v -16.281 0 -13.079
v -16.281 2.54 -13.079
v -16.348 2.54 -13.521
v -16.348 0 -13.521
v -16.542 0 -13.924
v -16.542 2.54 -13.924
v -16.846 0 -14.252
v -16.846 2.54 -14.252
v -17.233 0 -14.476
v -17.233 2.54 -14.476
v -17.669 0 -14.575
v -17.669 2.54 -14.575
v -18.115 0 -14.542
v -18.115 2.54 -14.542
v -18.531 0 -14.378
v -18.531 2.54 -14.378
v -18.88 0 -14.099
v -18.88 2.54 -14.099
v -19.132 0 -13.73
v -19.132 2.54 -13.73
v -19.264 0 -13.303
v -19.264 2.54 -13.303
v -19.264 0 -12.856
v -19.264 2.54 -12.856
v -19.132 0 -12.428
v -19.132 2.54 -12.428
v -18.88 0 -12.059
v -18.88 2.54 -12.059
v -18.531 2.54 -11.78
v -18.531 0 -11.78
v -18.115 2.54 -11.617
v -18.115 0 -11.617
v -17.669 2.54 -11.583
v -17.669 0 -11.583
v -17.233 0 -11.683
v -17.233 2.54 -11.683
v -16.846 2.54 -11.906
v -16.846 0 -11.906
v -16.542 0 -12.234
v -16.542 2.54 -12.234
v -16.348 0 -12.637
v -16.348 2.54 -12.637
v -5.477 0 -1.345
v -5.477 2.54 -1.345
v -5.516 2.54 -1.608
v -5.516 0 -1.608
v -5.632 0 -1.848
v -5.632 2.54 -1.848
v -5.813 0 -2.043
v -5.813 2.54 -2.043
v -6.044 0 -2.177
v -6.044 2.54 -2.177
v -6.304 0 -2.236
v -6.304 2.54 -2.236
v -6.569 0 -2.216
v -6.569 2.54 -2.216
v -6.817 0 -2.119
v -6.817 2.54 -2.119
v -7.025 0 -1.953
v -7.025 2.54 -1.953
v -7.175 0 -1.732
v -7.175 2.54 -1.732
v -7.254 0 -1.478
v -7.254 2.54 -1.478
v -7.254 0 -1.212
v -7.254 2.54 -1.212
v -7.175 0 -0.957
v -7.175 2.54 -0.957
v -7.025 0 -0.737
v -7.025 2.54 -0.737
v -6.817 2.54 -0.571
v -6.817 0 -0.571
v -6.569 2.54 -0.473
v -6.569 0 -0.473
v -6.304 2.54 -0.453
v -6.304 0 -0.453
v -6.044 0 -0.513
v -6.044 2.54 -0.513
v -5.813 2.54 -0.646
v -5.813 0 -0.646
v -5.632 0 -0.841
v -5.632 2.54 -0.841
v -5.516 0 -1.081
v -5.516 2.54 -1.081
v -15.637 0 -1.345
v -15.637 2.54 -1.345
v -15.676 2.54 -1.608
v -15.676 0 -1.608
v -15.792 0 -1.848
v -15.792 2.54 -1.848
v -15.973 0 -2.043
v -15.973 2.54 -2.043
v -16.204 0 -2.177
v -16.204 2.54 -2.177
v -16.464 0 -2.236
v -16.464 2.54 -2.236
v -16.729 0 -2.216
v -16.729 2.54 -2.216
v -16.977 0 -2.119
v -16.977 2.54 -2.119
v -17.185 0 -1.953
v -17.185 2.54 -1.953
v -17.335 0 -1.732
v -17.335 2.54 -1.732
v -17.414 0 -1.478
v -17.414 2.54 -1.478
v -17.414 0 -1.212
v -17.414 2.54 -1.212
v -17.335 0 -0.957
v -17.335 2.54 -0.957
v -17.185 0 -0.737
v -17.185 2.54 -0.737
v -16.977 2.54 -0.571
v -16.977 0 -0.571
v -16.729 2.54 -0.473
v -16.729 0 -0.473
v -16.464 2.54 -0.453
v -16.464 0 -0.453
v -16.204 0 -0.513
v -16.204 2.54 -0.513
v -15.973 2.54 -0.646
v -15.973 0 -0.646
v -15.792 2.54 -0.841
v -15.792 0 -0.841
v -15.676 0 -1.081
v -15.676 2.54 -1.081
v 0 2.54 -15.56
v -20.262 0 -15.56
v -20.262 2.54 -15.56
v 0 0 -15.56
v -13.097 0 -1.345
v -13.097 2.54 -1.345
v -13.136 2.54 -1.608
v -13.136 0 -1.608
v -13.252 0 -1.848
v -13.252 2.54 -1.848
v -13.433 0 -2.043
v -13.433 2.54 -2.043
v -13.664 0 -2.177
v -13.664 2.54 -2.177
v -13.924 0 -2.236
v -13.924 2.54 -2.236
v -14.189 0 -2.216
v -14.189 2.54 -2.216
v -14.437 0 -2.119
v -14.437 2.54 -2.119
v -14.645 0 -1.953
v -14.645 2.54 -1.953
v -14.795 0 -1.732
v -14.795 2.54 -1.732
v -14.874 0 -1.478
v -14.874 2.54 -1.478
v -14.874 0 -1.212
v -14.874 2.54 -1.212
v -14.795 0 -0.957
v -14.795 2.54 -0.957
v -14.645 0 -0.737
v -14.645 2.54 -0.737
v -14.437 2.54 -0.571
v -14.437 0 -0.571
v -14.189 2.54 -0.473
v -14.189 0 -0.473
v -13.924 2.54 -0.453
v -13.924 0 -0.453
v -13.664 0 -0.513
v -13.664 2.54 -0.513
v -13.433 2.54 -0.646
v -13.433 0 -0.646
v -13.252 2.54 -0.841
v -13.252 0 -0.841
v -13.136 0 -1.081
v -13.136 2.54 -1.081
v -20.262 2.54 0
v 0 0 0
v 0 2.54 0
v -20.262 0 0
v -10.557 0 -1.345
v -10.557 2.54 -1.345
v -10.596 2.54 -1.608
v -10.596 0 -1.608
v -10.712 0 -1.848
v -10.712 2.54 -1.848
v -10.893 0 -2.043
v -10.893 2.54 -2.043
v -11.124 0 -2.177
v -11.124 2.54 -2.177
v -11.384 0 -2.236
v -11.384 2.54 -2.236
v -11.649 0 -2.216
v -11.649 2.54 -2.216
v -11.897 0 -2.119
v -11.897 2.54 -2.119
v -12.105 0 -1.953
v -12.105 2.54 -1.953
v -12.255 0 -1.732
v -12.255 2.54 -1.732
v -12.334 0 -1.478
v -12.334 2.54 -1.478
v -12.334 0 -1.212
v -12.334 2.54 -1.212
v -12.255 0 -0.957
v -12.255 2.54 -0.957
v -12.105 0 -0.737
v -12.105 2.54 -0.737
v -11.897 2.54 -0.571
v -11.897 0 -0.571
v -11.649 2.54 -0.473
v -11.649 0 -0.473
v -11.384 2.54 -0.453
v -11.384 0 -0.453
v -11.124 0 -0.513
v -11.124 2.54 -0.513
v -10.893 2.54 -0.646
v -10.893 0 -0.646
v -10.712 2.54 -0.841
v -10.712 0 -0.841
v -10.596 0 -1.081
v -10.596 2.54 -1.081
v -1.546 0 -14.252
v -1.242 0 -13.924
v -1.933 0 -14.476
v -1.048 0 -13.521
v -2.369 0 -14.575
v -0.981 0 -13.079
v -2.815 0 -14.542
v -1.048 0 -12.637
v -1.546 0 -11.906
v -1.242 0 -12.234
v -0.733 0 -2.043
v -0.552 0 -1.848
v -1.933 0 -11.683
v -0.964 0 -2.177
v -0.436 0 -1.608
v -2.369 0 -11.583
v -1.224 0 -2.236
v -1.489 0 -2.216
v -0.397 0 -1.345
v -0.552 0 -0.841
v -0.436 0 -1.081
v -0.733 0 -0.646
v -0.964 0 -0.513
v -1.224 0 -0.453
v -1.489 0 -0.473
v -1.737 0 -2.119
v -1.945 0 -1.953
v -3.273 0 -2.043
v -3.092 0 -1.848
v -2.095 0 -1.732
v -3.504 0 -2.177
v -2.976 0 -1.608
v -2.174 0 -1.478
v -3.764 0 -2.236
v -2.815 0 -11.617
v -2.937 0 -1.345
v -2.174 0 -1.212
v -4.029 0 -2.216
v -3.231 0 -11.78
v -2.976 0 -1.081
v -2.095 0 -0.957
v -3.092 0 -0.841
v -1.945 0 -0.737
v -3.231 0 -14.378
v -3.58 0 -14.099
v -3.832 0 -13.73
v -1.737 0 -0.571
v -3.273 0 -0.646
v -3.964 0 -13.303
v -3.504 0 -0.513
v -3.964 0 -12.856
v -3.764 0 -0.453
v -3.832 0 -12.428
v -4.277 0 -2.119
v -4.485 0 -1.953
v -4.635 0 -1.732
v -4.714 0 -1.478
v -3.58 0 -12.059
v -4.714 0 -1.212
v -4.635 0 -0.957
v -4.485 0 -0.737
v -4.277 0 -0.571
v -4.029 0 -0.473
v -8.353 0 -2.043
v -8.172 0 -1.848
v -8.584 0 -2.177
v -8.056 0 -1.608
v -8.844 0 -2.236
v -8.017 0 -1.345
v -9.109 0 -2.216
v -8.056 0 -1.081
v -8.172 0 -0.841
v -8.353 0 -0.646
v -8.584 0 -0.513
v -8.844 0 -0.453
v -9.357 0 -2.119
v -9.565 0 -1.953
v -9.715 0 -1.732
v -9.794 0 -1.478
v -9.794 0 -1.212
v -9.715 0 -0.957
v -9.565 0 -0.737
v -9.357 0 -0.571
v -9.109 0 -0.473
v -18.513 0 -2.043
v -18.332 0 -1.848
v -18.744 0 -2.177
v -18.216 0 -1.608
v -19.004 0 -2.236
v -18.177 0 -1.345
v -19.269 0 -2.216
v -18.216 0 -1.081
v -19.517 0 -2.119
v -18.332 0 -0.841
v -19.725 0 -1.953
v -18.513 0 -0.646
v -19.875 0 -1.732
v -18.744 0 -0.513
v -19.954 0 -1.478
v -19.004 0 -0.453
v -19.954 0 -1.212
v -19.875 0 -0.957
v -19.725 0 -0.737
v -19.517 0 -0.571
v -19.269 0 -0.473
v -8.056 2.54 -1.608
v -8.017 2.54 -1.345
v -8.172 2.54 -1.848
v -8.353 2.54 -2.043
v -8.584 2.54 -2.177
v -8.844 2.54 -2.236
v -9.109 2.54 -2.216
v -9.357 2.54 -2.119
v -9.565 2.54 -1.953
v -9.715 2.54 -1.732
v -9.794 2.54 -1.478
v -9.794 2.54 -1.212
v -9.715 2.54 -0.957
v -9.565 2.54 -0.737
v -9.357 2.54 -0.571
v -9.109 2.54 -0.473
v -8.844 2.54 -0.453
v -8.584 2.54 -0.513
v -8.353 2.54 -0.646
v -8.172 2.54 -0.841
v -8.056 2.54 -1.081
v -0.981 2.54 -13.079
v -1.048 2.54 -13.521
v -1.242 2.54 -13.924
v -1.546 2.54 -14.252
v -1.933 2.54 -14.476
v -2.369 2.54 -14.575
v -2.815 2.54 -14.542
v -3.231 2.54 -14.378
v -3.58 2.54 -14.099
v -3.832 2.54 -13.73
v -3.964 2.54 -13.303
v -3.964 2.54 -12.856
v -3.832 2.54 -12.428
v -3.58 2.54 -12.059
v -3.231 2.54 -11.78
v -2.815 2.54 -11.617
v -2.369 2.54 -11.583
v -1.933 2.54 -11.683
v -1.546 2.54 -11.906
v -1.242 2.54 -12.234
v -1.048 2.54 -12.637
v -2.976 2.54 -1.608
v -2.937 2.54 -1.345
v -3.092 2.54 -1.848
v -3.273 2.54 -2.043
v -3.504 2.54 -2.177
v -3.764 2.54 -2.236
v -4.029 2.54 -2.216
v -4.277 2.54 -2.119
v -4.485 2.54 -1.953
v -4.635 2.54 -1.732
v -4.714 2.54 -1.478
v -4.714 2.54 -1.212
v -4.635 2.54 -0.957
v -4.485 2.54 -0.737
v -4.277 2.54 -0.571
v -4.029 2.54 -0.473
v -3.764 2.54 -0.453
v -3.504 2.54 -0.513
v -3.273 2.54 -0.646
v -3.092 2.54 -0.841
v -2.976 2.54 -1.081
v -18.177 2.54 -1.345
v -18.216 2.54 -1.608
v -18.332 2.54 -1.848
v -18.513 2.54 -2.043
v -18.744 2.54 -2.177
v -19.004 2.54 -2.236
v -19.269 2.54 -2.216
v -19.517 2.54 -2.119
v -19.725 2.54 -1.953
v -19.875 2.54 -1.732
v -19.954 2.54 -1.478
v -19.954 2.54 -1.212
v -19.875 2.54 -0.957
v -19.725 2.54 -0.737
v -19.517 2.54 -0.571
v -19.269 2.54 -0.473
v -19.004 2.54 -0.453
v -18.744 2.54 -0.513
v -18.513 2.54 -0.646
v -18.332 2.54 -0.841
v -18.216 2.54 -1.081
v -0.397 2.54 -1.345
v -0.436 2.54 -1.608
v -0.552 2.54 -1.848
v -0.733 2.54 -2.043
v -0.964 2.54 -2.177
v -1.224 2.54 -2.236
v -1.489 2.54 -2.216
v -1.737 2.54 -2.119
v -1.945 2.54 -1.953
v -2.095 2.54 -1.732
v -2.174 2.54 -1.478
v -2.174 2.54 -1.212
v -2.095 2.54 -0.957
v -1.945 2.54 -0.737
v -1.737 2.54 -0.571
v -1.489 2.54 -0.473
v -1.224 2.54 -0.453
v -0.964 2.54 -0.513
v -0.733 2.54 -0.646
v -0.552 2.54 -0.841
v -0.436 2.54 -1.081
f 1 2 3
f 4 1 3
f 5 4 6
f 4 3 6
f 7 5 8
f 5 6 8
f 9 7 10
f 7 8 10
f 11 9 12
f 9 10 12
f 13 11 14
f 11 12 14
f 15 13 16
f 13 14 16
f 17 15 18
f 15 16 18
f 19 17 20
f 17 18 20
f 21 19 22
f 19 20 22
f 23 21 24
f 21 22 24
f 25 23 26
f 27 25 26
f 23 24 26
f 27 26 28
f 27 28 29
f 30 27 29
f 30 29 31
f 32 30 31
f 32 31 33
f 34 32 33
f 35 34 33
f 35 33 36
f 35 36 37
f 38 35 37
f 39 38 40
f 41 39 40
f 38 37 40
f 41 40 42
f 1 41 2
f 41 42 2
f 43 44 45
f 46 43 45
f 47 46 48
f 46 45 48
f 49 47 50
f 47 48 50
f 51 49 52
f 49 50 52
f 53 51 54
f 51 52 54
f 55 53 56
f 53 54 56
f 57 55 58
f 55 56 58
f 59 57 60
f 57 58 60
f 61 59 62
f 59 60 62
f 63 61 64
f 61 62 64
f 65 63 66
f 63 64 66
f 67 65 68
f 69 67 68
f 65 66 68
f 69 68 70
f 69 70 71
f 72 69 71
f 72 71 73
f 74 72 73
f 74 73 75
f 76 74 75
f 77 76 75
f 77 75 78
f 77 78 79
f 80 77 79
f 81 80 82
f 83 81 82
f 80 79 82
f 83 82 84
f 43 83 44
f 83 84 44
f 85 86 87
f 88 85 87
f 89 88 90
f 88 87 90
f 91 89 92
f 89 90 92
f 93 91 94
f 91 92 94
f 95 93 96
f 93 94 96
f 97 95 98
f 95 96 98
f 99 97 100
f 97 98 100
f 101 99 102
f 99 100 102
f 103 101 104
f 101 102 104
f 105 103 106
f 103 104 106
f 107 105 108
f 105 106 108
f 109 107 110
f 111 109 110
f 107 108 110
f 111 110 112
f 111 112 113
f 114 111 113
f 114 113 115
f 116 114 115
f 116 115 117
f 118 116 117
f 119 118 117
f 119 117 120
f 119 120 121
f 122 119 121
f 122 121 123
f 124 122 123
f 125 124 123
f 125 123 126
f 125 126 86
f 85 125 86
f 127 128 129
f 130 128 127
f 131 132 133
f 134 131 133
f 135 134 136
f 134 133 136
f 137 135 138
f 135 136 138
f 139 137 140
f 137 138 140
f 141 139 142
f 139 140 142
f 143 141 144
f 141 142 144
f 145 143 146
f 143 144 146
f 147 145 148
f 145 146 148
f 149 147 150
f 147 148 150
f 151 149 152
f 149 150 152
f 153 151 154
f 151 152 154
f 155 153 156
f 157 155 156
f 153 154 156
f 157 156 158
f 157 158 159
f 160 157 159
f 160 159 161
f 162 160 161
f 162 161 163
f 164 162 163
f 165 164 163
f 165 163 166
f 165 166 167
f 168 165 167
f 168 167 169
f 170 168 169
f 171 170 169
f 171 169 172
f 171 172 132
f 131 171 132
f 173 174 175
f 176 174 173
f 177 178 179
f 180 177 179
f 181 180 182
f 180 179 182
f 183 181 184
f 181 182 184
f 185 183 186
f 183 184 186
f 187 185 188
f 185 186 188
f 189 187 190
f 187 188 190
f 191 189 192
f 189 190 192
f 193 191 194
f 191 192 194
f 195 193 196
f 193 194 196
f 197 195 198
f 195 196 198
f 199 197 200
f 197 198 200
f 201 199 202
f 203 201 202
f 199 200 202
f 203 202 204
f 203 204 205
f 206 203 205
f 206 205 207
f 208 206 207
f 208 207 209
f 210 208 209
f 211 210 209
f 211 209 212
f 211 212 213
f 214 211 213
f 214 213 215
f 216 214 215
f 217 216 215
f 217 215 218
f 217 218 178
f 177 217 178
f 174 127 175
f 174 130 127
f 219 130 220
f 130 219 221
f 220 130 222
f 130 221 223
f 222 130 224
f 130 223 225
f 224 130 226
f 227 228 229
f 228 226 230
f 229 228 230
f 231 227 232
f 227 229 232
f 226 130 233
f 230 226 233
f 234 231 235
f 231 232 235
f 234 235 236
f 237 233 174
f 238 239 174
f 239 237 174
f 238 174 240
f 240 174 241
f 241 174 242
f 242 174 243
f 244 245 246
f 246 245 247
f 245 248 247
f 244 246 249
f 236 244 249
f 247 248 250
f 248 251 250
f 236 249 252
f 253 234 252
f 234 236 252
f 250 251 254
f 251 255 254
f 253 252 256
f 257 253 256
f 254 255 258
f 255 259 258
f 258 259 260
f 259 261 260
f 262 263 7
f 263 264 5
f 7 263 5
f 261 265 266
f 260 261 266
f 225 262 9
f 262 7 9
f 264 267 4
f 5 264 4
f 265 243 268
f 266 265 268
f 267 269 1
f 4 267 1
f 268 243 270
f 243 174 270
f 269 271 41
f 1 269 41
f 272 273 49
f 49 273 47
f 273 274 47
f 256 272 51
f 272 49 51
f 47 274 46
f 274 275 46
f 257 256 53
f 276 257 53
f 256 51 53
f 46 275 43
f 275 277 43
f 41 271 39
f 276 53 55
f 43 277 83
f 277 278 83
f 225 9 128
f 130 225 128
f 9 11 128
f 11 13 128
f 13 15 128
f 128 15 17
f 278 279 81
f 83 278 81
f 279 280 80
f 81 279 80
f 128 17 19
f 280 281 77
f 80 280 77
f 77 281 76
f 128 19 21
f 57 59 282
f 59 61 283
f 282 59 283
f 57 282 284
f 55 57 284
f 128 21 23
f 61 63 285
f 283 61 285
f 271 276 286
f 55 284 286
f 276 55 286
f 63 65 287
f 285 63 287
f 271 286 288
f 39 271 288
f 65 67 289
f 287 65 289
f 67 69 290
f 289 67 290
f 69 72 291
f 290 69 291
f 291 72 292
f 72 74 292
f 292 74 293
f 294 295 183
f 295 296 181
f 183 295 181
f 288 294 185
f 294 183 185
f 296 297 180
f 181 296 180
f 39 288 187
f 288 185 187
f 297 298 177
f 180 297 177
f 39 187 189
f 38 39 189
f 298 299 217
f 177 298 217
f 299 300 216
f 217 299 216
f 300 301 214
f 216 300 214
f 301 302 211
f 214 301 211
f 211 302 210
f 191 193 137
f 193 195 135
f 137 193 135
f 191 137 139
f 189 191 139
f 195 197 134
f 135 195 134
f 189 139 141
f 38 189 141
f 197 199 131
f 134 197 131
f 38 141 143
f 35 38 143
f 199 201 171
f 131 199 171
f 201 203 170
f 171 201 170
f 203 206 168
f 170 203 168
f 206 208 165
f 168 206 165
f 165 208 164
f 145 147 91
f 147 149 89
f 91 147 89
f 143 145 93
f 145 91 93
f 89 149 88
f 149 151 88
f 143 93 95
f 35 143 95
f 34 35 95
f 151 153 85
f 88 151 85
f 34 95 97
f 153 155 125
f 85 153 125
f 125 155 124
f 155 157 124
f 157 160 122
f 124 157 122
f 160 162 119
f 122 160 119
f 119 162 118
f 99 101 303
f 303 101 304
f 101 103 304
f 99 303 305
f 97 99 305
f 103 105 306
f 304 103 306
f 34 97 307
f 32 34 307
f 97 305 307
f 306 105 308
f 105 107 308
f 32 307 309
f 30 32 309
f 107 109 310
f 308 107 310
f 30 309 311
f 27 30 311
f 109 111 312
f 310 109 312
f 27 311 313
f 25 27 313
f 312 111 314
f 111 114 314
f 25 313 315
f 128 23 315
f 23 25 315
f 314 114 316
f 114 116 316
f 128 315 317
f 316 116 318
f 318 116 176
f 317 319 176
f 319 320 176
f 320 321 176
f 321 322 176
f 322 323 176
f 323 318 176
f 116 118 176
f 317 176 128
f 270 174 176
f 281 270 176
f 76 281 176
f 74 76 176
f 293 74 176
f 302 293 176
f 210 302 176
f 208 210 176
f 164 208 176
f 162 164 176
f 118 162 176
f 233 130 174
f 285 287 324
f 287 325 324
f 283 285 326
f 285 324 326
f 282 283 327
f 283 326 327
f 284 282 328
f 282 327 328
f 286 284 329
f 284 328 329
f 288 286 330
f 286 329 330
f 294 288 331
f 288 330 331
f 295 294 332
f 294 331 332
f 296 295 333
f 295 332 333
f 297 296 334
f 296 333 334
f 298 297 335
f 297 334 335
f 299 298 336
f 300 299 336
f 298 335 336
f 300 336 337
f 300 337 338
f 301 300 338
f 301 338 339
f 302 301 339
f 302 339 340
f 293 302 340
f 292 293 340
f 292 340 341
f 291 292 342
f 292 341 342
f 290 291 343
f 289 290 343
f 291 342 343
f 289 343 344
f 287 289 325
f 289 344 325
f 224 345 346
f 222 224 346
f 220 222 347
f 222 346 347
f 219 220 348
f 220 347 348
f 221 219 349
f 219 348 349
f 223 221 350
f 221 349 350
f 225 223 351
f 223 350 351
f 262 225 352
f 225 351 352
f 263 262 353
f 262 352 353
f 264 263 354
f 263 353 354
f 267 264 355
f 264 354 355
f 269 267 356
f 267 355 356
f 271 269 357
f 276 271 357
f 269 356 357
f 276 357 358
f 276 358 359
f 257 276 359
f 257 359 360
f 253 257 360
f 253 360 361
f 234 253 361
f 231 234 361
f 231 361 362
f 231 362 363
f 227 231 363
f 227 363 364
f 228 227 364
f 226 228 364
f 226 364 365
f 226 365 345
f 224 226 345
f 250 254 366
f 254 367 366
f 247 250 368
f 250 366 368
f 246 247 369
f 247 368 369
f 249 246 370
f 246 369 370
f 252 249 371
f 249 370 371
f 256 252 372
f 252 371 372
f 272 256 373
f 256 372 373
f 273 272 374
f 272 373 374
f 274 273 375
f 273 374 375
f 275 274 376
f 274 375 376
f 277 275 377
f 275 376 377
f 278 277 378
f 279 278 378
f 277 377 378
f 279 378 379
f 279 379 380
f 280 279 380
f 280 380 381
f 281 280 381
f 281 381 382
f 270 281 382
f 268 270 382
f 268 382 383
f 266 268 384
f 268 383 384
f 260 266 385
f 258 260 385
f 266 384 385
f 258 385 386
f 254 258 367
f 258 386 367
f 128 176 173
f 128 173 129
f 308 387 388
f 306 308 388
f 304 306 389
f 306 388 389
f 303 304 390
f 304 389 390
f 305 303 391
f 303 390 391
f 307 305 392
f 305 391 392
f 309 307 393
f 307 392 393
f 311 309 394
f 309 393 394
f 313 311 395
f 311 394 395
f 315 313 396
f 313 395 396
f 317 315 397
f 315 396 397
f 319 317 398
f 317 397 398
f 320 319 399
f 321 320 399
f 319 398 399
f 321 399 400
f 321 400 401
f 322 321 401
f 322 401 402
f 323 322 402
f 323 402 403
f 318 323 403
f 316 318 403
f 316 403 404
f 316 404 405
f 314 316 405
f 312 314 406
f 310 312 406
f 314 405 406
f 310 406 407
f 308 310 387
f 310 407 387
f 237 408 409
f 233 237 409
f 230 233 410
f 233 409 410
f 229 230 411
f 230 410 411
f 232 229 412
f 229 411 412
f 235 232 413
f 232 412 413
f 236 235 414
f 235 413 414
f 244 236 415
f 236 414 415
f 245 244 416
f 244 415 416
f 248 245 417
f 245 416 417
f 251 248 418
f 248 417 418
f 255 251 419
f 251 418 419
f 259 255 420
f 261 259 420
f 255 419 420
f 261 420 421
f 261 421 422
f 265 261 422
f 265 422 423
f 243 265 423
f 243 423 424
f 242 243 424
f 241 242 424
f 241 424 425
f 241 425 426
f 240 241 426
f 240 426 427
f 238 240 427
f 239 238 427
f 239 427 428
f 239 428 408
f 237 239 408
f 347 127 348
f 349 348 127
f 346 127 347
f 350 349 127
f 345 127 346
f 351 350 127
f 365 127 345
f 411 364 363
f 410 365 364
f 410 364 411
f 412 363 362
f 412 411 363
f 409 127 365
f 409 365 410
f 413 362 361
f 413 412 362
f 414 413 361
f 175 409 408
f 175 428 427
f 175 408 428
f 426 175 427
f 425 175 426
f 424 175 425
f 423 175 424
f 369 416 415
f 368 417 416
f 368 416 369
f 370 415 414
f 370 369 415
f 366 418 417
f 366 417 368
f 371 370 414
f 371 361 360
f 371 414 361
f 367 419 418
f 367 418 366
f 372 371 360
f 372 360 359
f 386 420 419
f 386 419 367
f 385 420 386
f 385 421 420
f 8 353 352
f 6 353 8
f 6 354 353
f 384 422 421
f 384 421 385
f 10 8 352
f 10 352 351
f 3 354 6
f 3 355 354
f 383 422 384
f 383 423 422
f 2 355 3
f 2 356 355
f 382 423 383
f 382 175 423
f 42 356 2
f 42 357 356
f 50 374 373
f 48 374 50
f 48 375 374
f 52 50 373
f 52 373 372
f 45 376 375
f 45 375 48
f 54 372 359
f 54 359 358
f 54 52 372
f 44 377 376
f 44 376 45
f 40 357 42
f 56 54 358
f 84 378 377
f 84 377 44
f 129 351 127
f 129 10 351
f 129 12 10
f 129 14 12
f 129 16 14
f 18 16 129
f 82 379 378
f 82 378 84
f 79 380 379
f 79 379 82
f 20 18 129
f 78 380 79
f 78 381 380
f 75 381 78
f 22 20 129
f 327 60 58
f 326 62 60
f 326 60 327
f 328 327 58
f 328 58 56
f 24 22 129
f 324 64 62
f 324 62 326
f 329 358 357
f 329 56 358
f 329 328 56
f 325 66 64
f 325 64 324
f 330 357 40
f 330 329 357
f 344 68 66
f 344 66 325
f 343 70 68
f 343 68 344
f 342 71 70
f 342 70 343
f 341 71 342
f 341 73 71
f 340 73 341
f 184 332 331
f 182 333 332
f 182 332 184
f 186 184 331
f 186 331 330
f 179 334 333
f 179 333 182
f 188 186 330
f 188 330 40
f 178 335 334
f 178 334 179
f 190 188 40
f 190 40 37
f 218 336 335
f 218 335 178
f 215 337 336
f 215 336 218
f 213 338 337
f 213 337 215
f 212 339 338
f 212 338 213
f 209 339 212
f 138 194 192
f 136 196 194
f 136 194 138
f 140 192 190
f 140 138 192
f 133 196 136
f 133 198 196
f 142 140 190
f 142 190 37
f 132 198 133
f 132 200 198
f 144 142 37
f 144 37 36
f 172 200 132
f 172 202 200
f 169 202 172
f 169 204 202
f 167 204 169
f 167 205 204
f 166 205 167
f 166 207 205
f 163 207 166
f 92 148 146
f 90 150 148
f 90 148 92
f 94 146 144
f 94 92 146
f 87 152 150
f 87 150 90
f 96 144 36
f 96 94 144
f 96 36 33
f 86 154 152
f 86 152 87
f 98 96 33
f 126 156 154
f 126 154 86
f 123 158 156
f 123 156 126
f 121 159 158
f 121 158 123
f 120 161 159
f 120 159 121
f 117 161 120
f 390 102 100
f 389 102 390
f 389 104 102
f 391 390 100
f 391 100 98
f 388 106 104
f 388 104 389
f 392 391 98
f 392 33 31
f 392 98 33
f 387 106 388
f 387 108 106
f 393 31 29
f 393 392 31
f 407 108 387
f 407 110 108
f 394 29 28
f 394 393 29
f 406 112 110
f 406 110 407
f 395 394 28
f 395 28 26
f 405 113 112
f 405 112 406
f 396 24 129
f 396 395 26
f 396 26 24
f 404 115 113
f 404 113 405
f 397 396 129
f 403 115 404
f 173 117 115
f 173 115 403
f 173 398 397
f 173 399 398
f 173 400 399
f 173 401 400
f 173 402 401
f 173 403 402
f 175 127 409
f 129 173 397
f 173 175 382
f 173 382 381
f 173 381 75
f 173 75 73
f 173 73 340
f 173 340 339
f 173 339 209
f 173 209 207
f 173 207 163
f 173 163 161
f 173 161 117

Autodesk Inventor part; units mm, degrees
ref_plane "YZ Plane" through (0, 0, 0) normal (1, 0, 0) x (0, 1, 0)
ref_plane "XZ Plane" through (0, 0, 0) normal (0, 1, 0) x (-1, 0, 0)
ref_plane "XY Plane" through (0, 0, 0) normal (0, 0, 1) x (1, 0, 0)
sketch "Sketch1" plane through (0, 0, 0) normal (0, 1, 0) x (-1, 0, 0)
  line L0 (0, 0) -> (20.2618, 0)
  line L1 (20.2618, 0) -> (20.2618, -15.5601)
  line L2 (20.2618, -15.5601) -> (0, -15.5601)
  line L3 (0, -15.5601) -> (0, 0)
  dimension "d0" = 20.2618
  dimension "d1" = 15.5601
extrude "Extrusion1" add sketch "Sketch1" along normal blind 2.54
sketch "Sketch2" plane through (0, 2.54, 0) normal (0, 1, 0) x (1, 0, 0)
  circle A0 centre (-19.0703, 1.3447) radius 0.8937
  line L0 (-20.2618, 15.5601) -> (-20.2618, 0) construction
  line L1 (-20.2618, 0) -> (0, 0) construction
  line L2 (-20.2618, 0) -> (0, 0) construction
  circle A1 centre (-16.5303, 1.3447) radius 0.8937
  circle A2 centre (-13.9903, 1.3447) radius 0.8937
  circle A3 centre (-11.4503, 1.3447) radius 0.8937
  circle A4 centre (-8.9103, 1.3447) radius 0.8937
  circle A5 centre (-6.3703, 1.3447) radius 0.8937
  circle A6 centre (-3.8303, 1.3447) radius 0.8937
  circle A7 centre (-1.2903, 1.3447) radius 0.8937
  circle A8 centre (-17.7809, 13.0792) radius 1.5
  circle A9 centre (-2.4809, 13.0792) radius 1.5
  line L3 (0, 15.5601) -> (-20.2618, 15.5601) projected
  line L4 (0, 0) -> (0, 15.5601) projected
  line L5 (-17.7809, 13.0792) -> (-2.4809, 13.0792) construction
  line L6 (-10.1309, 0) -> (-10.1309, 15.5601) construction
  point P0 (-10.1309, 13.0792)
  dimension "d6" = 2.54
  dimension "d11" = 3
  dimension "d12" = 3
  dimension "d17" = 15.3
  dimension "d18" = 2.4809
  dimension "d19" = 2.4809
extrude "Extrusion2" cut sketch "Sketch2" against normal up to next
sketch "Sketch3" plane through (0, 2.54, 0) normal (0, 1, 0) x (1, 0, 0)
  line L0 (-14.6694, 9.1277) -> (-2.5672, 9.1277) construction
  line L1 (-2.5672, 9.1277) -> (-2.5672, 4.9306) construction
  line L2 (-2.5672, 4.9306) -> (-14.6694, 4.9306) construction
  line L3 (-14.6694, 4.9306) -> (-14.6694, 9.1277) construction
  point P0 (0, 0)
equation "\"d19\" = d18"
properties part number "IMU_temp"
